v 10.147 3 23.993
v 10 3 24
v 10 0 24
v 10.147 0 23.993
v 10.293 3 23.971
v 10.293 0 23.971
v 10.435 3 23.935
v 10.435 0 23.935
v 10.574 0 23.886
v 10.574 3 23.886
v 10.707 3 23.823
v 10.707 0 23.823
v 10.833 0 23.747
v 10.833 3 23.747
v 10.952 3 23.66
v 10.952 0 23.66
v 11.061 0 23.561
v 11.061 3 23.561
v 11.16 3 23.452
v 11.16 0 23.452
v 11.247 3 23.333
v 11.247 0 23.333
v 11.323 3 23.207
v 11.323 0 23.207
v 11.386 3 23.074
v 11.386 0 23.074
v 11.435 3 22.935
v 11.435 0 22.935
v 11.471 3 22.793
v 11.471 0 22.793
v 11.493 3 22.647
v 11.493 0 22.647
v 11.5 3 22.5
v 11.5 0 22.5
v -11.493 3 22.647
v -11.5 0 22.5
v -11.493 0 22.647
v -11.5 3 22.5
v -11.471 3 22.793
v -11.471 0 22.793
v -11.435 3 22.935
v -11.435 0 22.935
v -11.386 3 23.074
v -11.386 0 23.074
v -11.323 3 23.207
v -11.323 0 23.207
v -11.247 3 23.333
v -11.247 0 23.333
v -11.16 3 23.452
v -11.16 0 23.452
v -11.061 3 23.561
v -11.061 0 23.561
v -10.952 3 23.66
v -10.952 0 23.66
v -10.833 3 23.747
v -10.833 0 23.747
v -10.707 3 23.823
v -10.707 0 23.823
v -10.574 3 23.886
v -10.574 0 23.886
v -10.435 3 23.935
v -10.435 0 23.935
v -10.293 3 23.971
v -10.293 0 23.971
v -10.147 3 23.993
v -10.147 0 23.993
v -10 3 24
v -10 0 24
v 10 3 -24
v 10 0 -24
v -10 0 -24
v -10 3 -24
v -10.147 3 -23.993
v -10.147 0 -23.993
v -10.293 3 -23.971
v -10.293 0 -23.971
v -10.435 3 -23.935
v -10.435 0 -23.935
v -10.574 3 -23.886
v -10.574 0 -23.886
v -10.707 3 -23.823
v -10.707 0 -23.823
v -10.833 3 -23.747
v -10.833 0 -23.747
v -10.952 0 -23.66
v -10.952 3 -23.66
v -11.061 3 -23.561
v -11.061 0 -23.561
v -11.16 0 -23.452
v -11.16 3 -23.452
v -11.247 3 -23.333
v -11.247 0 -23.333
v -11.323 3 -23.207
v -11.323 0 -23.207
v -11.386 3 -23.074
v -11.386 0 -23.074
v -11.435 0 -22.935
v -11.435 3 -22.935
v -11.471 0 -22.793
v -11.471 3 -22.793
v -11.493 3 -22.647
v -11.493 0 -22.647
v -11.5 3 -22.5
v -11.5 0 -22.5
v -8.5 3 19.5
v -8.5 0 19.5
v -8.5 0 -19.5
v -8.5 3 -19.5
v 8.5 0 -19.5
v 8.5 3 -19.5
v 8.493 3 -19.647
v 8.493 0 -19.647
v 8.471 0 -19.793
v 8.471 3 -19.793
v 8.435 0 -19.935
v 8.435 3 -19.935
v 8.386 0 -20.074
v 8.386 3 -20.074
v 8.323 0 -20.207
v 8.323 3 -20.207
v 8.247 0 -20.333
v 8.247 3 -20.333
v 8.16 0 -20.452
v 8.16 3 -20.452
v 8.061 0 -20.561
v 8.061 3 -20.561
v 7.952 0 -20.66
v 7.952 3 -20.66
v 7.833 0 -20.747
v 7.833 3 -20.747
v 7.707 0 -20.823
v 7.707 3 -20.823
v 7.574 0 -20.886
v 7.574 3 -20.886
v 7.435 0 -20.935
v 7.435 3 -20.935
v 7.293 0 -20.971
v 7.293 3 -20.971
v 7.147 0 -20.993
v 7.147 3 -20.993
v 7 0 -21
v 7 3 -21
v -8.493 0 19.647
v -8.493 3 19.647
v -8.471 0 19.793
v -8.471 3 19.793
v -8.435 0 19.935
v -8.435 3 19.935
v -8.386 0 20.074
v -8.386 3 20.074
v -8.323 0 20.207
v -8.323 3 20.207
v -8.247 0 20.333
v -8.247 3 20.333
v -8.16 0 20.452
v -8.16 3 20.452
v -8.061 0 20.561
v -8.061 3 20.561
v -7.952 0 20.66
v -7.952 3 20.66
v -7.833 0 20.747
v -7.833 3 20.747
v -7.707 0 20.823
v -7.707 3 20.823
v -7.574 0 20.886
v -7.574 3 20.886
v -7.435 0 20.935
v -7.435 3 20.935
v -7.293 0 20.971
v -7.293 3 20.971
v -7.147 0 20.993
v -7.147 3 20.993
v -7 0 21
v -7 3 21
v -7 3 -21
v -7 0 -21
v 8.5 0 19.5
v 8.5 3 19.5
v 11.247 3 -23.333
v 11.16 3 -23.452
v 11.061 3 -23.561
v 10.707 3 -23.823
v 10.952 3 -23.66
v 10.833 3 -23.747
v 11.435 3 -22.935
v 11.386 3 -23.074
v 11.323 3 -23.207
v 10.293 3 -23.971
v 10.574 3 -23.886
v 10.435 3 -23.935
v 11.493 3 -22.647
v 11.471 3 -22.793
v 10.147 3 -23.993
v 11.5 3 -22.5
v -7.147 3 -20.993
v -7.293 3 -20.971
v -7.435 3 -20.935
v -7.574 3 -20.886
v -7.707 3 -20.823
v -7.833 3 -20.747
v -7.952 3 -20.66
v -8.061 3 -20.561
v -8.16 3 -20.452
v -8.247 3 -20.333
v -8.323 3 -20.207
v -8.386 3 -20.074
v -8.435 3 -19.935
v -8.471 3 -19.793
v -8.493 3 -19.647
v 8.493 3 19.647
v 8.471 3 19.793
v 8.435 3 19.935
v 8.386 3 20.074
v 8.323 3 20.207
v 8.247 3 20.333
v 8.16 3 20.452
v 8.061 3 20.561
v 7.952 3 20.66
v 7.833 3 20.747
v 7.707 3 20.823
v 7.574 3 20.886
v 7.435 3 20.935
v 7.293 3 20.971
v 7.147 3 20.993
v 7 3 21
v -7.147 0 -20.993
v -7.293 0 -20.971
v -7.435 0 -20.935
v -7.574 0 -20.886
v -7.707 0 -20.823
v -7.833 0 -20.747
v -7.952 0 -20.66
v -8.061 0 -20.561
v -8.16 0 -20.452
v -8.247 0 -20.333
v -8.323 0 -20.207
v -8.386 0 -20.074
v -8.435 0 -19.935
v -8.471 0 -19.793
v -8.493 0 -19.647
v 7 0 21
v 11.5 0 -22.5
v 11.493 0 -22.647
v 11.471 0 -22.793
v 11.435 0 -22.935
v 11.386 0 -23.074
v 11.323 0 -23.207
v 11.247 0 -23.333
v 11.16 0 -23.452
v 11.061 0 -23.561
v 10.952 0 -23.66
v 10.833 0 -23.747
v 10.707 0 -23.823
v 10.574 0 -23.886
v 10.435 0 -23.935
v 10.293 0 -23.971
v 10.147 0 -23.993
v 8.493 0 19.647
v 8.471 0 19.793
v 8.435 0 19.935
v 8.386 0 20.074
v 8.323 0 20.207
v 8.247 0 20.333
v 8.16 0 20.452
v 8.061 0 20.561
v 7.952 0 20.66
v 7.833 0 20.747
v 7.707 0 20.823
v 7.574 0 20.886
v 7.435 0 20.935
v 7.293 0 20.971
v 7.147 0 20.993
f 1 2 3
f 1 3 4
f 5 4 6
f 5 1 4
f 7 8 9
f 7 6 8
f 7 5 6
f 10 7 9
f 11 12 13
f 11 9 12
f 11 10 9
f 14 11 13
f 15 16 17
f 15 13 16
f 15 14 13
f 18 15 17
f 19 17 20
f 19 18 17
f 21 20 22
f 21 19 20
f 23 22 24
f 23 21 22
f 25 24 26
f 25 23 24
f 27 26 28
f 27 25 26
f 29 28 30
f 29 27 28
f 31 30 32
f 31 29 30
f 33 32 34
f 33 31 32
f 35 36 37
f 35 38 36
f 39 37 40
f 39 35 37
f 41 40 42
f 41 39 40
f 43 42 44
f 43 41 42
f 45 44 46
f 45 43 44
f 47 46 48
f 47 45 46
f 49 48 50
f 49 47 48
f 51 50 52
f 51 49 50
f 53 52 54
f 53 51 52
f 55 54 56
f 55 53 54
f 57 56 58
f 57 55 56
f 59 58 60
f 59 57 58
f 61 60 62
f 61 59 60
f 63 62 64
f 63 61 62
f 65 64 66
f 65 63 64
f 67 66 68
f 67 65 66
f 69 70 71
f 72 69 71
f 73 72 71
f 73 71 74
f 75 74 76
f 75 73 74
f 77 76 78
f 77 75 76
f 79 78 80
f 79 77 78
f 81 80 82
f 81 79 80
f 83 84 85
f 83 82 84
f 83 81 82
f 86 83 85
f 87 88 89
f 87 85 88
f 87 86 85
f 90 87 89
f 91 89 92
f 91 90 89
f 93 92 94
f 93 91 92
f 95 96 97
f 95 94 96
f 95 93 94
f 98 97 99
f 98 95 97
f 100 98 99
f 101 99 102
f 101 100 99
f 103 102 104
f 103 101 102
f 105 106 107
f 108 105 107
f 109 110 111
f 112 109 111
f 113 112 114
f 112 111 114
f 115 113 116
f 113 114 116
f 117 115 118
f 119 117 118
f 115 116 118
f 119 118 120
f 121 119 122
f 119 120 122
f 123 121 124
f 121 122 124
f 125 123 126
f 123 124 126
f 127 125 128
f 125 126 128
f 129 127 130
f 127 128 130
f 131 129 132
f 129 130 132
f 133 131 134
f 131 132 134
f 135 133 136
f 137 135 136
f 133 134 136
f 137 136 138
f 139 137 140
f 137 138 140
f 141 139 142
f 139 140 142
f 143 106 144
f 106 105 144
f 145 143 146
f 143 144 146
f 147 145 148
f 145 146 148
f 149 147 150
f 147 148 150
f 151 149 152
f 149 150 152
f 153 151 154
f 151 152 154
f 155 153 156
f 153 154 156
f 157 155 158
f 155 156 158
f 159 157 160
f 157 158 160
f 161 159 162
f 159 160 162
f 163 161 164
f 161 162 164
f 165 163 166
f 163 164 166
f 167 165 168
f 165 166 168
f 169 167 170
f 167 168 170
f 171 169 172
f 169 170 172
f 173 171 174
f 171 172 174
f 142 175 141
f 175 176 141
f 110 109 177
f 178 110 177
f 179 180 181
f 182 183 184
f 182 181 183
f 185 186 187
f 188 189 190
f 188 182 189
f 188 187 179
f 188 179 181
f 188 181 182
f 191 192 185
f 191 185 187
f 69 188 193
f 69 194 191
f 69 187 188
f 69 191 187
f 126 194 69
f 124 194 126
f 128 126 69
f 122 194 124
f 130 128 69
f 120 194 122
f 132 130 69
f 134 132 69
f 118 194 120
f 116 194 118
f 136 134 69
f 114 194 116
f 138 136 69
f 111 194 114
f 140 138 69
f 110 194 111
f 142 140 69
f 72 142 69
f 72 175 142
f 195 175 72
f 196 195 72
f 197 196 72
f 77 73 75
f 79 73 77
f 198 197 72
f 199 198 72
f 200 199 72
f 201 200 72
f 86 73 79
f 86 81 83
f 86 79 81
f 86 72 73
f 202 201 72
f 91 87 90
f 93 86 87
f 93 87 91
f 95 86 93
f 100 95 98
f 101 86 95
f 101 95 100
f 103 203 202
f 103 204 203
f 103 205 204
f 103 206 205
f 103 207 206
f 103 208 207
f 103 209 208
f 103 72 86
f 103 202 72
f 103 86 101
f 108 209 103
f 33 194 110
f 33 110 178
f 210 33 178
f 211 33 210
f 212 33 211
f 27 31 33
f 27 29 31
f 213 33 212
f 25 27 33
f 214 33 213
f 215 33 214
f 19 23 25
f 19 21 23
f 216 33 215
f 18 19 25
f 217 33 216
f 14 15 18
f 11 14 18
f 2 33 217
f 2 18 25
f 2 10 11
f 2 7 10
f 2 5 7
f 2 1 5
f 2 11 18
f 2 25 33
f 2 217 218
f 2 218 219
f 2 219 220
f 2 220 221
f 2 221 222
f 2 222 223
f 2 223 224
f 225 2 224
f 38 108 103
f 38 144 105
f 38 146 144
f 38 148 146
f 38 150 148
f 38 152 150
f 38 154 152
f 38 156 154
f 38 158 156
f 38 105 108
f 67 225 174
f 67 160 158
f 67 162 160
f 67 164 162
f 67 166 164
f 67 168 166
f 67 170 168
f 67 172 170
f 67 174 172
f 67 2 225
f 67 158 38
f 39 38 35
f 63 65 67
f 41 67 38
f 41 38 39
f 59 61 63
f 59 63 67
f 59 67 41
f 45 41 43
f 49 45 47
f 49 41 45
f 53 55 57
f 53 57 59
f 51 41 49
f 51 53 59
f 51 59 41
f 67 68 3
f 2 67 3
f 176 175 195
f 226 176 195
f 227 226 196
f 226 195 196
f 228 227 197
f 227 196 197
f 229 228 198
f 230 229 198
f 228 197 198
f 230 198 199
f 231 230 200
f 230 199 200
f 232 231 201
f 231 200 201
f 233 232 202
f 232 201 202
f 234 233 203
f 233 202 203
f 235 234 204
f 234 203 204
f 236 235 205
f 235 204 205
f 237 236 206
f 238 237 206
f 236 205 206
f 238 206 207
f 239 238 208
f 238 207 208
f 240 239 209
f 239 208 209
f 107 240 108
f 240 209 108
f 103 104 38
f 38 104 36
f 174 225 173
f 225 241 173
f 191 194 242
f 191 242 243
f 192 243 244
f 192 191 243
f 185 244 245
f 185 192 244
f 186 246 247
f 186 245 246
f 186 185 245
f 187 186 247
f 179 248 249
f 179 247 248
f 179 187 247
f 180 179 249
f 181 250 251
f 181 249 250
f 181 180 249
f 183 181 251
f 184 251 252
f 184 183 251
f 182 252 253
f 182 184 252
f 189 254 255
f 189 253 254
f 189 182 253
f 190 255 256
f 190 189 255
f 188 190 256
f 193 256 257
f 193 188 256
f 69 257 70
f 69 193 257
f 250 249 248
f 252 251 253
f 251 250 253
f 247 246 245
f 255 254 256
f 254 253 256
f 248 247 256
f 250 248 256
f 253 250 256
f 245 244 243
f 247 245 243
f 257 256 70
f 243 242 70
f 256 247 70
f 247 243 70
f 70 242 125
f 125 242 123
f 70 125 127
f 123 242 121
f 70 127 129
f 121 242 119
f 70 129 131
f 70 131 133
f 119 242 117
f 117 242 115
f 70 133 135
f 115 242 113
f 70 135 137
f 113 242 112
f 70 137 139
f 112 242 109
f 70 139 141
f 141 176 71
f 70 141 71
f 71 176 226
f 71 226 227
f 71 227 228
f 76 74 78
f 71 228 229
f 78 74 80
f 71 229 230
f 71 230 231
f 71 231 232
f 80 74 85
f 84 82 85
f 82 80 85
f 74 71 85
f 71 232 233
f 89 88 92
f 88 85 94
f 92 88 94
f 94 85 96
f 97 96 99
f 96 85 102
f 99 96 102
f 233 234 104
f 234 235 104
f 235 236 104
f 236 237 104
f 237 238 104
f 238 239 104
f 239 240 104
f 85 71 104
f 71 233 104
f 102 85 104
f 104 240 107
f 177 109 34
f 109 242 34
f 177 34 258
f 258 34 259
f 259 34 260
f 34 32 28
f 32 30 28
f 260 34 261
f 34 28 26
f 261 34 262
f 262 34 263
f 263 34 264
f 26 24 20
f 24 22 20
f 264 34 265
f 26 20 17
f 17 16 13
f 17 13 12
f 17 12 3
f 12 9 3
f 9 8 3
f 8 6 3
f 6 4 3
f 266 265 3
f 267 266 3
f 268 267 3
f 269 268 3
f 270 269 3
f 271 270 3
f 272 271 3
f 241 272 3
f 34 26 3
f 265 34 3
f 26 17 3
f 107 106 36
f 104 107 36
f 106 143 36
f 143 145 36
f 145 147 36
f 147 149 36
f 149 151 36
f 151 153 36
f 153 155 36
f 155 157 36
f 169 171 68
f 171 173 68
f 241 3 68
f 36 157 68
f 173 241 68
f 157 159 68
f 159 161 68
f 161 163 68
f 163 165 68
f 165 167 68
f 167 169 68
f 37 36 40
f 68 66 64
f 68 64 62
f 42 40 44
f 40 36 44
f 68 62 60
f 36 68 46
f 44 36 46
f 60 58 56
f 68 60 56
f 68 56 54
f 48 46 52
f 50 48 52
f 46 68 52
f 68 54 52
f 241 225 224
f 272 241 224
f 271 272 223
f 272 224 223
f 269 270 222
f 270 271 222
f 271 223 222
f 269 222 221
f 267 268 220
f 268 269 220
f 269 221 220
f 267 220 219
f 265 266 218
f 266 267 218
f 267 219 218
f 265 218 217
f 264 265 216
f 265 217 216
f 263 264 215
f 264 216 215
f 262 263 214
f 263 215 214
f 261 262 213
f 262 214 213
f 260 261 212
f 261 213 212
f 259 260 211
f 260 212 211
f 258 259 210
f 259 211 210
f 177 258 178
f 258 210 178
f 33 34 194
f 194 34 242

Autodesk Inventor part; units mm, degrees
ref_plane "YZ Plane" through (0, 0, 0) normal (1, 0, 0) x (0, 1, 0)
ref_plane "XZ Plane" through (0, 0, 0) normal (0, 1, 0) x (-1, 0, 0)
ref_plane "XY Plane" through (0, 0, 0) normal (0, 0, 1) x (1, 0, 0)
sketch "Sketch1" plane through (0, 0, 0) normal (0, 1, 0) x (-1, 0, 0)
  line L0 (11.5, 24) -> (-11.5, 24)
  line L1 (-11.5, 24) -> (-11.5, -24)
  line L2 (-11.5, -24) -> (11.5, -24)
  line L3 (11.5, -24) -> (11.5, 24)
  line L4 (11.5, 24) -> (-11.5, -24) construction
  line L5 (-11.5, 24) -> (11.5, -24) construction
  line L6 (-8.5, 21) -> (8.5, 21)
  line L7 (8.5, 21) -> (8.5, -21)
  line L8 (8.5, -21) -> (-8.5, -21)
  line L9 (-8.5, -21) -> (-8.5, 21)
  line L10 (-8.5, 21) -> (8.5, -21) construction
  line L11 (8.5, 21) -> (-8.5, -21) construction
  line L12 (0, 0) -> (-8.5, 0) construction
  circle A0 centre (0, -12) radius 1.5
  circle A1 centre (0, 12) radius 1.5
  line L13 (17.5, 30) -> (-17.5, 30)
  line L14 (-17.5, 30) -> (-17.5, -30)
  line L15 (-17.5, -30) -> (17.5, -30)
  line L16 (17.5, -30) -> (17.5, 30)
  line L17 (17.5, 30) -> (-17.5, -30) construction
  line L18 (-17.5, 30) -> (17.5, -30) construction
  circle A2 centre (14.5, 27) radius 1.5
  circle A3 centre (-14.5, 27) radius 1.5
  circle A4 centre (14.5, -27) radius 1.5
  circle A5 centre (-14.5, -27) radius 1.5
  dimension "d0" = 23
  dimension "d1" = 48
  dimension "d3" = 3
  dimension "d4" = 3
  dimension "d5" = 3
  dimension "d6" = 12
  dimension "d9" = 6
  dimension "d10" = 6
  dimension "d13" = 3
  dimension "d14" = 3
  dimension "d15" = 3
  dimension "d16" = 3
  dimension "d17" = 3
  dimension "d18" = 3
extrude "Extrusion1" add sketch "Sketch1" along normal blind 3 contours L3 L2 L1 L0
fillet "Fillet2" radius 1.5 4 edges at (11.5, 1.5, 24) (-11.5, 1.5, 24) (-11.5, 1.5, -24) (11.5, 1.5, -24)
fillet "Fillet3" radius 1.5 4 edges at (8.5, 1.5, -21) (8.5, 1.5, 21) (-8.5, 1.5, 21) (-8.5, 1.5, -21)
properties part number "Chamber"
